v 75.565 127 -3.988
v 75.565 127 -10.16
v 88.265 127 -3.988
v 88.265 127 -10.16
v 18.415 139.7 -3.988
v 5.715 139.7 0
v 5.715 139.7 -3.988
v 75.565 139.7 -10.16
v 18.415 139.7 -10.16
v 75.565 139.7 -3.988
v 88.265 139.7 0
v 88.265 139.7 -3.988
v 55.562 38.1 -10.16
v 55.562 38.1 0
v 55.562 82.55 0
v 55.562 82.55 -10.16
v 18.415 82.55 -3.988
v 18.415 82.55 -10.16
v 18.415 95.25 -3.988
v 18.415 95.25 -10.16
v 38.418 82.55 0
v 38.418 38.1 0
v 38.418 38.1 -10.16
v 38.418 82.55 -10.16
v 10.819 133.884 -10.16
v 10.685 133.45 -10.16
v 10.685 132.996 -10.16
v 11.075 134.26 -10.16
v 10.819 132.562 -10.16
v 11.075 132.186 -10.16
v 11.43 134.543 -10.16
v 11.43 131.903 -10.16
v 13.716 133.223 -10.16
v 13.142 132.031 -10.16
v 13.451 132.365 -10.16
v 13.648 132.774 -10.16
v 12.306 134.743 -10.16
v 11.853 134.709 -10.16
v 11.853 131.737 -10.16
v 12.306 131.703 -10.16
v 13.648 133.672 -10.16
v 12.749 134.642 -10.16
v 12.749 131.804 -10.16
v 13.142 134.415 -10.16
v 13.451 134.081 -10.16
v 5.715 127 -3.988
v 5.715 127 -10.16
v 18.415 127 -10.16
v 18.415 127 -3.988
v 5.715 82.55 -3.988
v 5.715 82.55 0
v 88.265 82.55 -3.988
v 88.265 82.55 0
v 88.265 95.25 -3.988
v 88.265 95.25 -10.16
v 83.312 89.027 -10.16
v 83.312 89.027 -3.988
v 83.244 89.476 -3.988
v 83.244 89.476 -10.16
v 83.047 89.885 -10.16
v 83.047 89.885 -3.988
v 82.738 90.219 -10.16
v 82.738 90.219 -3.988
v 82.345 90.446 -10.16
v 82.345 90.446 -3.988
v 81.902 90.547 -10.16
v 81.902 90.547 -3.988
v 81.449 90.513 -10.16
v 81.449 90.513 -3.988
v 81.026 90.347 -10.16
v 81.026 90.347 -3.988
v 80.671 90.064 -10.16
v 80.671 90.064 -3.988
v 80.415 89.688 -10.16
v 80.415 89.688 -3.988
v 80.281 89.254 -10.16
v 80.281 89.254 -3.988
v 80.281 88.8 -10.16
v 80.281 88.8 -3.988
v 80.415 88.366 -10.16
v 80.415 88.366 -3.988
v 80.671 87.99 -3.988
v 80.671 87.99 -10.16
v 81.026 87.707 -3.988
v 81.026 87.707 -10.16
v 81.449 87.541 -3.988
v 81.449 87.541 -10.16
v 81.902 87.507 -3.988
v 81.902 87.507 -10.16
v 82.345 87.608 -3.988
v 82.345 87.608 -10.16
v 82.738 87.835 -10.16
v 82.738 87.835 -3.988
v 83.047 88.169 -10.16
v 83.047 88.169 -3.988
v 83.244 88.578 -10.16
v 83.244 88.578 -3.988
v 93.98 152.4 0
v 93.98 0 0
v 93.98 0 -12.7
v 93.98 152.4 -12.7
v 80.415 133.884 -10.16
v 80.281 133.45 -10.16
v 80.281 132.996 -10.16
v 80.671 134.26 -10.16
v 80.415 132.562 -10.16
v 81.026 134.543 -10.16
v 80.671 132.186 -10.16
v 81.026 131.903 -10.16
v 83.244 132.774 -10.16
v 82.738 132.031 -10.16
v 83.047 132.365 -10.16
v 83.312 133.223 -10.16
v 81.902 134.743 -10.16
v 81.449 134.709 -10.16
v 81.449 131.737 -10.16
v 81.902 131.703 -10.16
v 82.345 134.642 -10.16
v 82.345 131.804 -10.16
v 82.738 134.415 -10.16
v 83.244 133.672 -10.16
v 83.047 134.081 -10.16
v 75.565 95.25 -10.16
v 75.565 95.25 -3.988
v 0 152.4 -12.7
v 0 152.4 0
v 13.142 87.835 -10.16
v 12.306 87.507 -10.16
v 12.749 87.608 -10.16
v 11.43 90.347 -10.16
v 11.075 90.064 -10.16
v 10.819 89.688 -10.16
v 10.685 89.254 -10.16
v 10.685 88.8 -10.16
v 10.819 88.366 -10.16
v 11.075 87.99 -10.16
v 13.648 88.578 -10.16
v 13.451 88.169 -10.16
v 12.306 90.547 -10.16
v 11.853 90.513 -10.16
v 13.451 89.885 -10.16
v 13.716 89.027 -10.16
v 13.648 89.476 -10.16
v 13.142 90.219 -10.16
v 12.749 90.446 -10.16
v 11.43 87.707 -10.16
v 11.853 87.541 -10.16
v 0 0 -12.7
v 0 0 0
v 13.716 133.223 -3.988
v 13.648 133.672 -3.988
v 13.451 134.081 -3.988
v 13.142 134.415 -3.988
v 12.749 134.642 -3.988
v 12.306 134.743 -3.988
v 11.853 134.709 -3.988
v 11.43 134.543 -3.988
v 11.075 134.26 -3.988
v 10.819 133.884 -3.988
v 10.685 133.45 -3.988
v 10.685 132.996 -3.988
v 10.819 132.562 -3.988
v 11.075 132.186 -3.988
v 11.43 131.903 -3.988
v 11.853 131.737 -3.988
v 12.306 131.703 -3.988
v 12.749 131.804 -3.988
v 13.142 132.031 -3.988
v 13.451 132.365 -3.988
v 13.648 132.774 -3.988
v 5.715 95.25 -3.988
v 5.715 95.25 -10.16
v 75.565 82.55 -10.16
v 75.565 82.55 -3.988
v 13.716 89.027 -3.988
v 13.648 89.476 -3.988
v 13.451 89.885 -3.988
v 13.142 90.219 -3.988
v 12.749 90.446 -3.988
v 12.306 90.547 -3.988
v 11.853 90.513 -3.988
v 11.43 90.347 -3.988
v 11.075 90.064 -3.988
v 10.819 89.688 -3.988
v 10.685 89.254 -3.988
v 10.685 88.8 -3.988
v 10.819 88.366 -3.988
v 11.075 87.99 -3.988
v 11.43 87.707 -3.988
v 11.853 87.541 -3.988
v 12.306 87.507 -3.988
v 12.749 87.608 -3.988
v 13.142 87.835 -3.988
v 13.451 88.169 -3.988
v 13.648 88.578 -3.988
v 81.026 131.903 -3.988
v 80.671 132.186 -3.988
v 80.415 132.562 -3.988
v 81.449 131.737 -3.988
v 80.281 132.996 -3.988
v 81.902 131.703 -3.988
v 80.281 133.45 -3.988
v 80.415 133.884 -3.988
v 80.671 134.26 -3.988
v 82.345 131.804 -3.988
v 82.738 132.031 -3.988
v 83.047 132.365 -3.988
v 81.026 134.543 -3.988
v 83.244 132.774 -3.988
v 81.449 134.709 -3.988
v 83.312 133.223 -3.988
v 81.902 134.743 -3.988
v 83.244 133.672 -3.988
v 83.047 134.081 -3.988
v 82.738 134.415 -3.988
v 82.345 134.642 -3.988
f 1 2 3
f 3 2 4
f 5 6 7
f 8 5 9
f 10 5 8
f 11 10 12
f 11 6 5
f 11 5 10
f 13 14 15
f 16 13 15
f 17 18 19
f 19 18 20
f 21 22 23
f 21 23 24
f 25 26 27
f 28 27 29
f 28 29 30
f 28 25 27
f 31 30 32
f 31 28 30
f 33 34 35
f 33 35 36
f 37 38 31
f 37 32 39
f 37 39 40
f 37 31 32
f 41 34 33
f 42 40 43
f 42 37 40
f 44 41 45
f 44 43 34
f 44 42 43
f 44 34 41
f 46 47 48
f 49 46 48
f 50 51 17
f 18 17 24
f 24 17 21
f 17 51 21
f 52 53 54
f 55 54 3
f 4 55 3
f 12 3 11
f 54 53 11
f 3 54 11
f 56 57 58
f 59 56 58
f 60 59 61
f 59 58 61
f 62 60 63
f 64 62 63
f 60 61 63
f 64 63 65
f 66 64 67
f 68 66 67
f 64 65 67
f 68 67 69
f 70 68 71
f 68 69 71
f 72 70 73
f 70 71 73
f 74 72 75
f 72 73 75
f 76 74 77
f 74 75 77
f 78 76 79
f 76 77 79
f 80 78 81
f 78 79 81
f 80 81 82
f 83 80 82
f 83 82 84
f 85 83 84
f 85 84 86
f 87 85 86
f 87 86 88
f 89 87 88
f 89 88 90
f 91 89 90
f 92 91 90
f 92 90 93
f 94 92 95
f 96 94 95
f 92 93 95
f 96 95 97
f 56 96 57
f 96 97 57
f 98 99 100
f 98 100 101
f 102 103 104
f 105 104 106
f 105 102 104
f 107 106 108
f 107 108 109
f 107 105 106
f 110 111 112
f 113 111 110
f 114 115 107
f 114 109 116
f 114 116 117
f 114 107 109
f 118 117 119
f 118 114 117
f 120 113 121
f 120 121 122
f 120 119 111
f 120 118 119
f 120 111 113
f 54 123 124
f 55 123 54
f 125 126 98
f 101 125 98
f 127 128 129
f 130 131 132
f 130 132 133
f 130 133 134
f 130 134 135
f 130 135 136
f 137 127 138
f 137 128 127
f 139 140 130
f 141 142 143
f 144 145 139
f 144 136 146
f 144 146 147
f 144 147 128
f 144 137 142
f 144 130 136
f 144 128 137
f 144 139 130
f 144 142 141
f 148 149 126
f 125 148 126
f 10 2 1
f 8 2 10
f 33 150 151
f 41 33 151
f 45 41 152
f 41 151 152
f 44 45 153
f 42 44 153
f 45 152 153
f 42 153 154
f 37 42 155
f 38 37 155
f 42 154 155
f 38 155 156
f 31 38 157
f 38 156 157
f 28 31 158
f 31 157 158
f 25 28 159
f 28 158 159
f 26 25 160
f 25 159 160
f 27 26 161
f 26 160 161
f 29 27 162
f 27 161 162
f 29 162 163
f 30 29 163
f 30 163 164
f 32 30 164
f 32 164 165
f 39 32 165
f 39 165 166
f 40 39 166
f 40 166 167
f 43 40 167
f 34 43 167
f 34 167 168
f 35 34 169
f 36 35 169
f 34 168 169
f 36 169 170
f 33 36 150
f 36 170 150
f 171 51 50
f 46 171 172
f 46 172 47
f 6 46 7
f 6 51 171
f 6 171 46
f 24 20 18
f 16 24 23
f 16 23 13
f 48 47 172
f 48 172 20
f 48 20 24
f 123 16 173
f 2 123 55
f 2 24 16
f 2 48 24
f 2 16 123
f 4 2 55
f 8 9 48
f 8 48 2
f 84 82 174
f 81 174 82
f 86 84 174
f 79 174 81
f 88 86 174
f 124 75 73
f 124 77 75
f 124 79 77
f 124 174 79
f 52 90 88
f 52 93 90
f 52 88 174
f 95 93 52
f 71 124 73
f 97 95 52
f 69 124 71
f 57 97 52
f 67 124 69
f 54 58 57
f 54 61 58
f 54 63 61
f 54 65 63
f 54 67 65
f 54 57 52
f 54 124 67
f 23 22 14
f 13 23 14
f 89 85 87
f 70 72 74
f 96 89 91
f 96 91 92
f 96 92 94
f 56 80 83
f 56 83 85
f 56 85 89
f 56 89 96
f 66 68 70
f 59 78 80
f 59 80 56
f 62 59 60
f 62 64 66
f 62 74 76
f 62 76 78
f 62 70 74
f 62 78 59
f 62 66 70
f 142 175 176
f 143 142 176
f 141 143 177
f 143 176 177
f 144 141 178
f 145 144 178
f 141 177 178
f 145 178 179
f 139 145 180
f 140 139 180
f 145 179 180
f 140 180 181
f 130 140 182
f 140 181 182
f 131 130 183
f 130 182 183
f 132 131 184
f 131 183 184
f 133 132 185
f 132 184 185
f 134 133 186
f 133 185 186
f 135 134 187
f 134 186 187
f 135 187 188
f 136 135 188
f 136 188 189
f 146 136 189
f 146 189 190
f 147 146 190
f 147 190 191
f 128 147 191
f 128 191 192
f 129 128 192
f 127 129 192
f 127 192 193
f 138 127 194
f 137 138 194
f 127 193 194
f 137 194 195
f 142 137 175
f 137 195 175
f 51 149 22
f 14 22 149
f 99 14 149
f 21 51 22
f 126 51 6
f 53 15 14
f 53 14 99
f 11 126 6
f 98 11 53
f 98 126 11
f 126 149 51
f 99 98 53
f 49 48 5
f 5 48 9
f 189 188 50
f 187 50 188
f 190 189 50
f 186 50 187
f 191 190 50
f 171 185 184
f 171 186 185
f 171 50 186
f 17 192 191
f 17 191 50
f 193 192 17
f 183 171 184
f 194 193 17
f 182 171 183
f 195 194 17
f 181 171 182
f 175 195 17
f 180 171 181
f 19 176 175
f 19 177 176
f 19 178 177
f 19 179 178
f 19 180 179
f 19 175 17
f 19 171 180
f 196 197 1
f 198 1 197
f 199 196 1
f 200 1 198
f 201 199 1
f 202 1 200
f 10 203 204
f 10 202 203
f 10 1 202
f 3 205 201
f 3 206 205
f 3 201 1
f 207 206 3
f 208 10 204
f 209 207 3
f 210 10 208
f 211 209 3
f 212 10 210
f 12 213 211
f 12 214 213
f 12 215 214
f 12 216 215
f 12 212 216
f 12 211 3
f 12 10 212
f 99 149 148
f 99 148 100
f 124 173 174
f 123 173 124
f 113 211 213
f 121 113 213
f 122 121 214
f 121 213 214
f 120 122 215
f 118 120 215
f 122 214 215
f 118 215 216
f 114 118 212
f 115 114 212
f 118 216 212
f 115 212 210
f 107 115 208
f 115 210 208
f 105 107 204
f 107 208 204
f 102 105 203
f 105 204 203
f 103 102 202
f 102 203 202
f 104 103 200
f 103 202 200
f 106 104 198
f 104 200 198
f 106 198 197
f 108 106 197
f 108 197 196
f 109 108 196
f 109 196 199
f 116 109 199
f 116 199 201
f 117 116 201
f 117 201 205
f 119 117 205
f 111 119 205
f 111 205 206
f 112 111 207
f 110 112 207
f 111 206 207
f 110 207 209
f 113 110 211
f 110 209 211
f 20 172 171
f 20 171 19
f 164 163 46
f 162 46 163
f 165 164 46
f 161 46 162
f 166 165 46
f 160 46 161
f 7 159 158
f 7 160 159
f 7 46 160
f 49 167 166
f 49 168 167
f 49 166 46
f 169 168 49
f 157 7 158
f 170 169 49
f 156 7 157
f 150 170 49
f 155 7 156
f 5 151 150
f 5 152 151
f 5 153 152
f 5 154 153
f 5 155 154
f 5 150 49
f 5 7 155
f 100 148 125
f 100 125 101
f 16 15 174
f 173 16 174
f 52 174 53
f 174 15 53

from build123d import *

# Parameters (mm, degrees)
F0_W      = 93.98
F0_H      = 152.4
F1_DEPTH  = 12.7
F2_W      = 82.55
F2_H      = 57.15
F3_DEPTH  = 10.16
F5_W      = 12.7
F5_H      = 12.7
F6_DEPTH  = 6.1722
F7_R      = 1.524
F8_DEPTH  = 6.1722
F9_W      = 17.145
F9_H      = 50.8
F10_DEPTH = 10.16


with BuildPart() as f1:
    # F0 (on Top) → F1 (new body)
    with BuildSketch(Plane.XY):
        with Locations((46.99, 76.2)):
            Rectangle(F0_W, F0_H)
    extrude(amount=-F1_DEPTH)

    # F2 (on Top) → F3 (cut)
    with BuildSketch(Plane.XY):
        with Locations((46.99, 111.125)):
            Rectangle(F2_W, F2_H)
    extrude(amount=-F3_DEPTH, mode=Mode.SUBTRACT)

    # F5 (on face) → F6 (join)
    with BuildSketch(Plane.XY.offset(-10.16)):
        with Locations((12.065, 133.35)):
            Rectangle(F5_W, F5_H)
        with Locations((81.915, 133.35)):
            Rectangle(F5_W, F5_H)
        with Locations((12.065, 88.9)):
            Rectangle(F5_W, F5_H)
        with Locations((81.915, 88.9)):
            Rectangle(F5_W, F5_H)
    extrude(amount=F6_DEPTH)

    # F7 (on face) → F8 (cut)
    with BuildSketch(Plane.XY.offset(-3.9878)):
        with Locations((12.192, 133.223)):
            Circle(F7_R)
        with Locations((81.788, 133.223)):
            Circle(F7_R)
        with Locations((12.192, 89.027)):
            Circle(F7_R)
        with Locations((81.788, 89.027)):
            Circle(F7_R)
    extrude(amount=-F8_DEPTH, mode=Mode.SUBTRACT)

    # F9 (on face) → F10 (cut)
    with BuildSketch(Plane.XY):
        with Locations((46.99, 63.5)):
            Rectangle(F9_W, F9_H)
    extrude(amount=-F10_DEPTH, mode=Mode.SUBTRACT)


solid = f1.part
